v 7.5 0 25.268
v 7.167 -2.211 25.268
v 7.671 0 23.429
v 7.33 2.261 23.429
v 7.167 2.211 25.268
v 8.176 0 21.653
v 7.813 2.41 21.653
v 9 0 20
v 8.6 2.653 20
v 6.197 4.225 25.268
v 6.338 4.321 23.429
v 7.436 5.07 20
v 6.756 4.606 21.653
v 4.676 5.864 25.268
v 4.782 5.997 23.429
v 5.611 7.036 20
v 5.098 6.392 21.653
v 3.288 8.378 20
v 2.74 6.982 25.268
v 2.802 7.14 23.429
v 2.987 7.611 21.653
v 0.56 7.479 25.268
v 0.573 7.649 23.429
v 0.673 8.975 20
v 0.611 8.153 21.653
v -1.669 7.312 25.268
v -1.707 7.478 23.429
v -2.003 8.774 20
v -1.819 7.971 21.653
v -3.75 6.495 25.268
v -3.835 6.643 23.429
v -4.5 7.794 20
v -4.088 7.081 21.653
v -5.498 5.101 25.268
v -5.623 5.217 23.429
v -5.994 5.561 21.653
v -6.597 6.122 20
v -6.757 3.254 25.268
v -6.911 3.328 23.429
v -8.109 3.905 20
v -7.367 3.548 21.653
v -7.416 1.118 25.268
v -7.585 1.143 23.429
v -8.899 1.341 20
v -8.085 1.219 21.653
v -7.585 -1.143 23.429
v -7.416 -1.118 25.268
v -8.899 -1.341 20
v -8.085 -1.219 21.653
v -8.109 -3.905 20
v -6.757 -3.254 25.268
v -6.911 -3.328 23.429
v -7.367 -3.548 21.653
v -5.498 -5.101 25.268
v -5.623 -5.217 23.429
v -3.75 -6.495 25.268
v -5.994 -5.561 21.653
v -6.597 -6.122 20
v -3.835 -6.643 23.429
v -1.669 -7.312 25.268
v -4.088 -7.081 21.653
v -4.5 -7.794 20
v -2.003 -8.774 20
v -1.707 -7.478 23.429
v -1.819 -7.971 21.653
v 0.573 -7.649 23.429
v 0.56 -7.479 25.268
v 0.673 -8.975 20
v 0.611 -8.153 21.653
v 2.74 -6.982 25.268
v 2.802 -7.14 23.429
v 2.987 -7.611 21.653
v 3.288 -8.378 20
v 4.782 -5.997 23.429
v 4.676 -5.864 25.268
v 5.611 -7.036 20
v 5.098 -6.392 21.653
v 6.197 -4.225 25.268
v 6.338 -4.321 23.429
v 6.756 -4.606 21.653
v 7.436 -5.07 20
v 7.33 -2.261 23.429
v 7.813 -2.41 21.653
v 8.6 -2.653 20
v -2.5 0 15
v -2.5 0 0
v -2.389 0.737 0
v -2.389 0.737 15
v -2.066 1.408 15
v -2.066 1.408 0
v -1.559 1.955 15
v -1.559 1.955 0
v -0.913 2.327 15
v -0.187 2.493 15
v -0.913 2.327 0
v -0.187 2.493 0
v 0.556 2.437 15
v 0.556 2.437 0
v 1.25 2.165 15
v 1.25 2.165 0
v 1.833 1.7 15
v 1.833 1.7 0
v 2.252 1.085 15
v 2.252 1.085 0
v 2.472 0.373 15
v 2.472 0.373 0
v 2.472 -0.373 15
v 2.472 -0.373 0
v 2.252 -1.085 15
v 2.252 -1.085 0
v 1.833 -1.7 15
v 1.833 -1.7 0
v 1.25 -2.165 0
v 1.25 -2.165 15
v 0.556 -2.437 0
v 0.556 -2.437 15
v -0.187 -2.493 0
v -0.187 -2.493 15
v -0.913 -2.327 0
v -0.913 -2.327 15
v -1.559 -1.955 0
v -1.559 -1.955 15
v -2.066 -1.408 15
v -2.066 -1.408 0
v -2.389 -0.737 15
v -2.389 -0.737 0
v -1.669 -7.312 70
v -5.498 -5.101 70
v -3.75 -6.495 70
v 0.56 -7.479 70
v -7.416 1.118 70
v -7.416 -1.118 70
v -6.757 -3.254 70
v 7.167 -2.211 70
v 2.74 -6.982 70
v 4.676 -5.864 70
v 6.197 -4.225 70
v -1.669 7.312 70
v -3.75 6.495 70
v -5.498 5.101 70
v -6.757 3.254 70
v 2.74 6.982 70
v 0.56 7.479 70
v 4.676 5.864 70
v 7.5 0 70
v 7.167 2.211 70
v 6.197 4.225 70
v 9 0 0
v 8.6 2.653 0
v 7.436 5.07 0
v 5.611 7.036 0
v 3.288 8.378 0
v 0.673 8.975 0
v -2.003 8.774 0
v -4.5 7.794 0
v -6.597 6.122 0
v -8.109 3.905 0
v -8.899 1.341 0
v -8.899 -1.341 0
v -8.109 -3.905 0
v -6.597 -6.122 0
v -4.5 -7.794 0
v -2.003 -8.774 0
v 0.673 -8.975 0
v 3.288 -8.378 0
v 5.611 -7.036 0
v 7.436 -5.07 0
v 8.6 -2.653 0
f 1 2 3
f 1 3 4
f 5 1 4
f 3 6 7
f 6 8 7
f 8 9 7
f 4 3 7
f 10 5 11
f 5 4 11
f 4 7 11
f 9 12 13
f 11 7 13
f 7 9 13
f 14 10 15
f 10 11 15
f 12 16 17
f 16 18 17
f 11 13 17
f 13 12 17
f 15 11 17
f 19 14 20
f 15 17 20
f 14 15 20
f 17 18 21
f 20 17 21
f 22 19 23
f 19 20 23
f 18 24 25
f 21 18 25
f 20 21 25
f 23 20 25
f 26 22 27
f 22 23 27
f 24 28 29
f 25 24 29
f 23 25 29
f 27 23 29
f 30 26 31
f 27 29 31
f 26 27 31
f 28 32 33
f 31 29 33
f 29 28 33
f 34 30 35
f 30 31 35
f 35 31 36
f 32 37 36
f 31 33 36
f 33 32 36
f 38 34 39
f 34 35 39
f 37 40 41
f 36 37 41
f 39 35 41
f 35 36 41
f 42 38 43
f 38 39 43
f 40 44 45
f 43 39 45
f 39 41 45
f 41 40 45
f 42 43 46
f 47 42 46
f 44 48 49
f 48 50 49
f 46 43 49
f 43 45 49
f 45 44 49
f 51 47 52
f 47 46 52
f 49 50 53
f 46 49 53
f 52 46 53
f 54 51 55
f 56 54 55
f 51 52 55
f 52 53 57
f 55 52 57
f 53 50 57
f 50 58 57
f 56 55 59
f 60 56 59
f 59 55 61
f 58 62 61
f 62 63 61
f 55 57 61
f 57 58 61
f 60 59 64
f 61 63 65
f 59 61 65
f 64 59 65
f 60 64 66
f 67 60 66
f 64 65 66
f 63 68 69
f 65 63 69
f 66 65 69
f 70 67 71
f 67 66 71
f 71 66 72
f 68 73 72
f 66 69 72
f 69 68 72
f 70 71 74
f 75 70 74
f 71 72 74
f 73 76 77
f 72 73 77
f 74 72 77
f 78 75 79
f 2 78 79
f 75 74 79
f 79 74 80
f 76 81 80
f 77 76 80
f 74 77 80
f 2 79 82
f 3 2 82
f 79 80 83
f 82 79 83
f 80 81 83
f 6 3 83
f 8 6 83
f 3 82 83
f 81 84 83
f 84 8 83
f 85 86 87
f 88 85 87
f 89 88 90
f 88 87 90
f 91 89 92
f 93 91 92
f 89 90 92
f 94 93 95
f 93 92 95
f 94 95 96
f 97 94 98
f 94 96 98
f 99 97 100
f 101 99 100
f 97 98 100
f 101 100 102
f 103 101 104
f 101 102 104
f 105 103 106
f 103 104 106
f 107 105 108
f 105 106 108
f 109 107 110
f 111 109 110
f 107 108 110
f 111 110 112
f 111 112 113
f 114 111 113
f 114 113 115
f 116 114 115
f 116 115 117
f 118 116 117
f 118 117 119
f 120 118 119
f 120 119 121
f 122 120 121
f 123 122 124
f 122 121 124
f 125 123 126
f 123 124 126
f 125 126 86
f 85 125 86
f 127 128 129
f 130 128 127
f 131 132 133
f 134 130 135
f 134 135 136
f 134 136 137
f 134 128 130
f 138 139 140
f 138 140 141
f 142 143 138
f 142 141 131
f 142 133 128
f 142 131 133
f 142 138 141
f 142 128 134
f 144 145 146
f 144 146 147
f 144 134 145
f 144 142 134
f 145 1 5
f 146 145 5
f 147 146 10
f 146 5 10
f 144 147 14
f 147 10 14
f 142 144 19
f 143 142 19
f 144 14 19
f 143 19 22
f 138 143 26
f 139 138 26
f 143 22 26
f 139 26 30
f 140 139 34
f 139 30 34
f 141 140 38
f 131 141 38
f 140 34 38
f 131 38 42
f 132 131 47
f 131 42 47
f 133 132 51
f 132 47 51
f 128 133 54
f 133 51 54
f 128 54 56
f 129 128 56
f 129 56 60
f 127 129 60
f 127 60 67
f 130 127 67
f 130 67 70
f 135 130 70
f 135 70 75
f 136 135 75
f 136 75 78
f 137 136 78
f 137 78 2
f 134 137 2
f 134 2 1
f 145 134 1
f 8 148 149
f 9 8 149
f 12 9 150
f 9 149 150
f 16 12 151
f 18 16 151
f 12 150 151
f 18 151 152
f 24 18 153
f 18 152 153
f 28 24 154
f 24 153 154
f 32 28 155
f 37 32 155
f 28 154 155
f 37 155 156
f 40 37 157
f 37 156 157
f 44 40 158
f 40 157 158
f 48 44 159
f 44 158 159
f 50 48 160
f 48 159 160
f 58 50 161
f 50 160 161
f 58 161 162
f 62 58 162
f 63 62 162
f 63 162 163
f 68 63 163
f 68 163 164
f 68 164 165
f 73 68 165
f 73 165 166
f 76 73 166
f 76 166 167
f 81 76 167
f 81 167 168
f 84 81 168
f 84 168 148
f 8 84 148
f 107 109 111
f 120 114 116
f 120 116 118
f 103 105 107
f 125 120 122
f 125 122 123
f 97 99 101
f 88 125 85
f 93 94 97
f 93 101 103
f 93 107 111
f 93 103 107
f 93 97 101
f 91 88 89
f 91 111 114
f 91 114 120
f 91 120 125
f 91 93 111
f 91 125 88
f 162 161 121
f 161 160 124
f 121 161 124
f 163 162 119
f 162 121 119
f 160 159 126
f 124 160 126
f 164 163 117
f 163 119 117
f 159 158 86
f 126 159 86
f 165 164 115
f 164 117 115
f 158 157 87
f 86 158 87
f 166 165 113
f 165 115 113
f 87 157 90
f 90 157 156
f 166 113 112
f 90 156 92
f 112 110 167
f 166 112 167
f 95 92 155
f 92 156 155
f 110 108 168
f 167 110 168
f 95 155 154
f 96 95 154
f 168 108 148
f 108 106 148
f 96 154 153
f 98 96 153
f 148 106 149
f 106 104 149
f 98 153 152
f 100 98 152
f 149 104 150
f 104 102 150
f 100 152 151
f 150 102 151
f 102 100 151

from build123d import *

# Parameters (mm, degrees)
SKETCH1_R           = 9
BOSS_EXTRUDE1_DEPTH = 70
SKETCH2_R           = 2.5
CUT_EXTRUDE1_DEPTH  = 15
CUT_EXTRUDE2_START  = -50
SKETCH3_R           = 9
SKETCH3_R_2         = 7.5
CUT_EXTRUDE2_DEPTH  = 50
FILLET1_R           = 10


with BuildPart() as part:
    # Sketch1 → Boss-Extrude1 (new body)
    with BuildSketch(Plane.XY):
        Circle(SKETCH1_R)
    extrude(amount=BOSS_EXTRUDE1_DEPTH)

    # Sketch2 → Cut-Extrude1 (cut)
    with BuildSketch(Plane(origin=(0, 0, 0), x_dir=(-1, 0, 0), z_dir=(0, 0, -1))):
        Circle(SKETCH2_R)
    extrude(amount=-CUT_EXTRUDE1_DEPTH, mode=Mode.SUBTRACT)

    # Sketch3 → Cut-Extrude2 (cut)
    with BuildSketch(Plane.XY.offset(70).offset(CUT_EXTRUDE2_START)):
        Circle(SKETCH3_R)
        Circle(SKETCH3_R_2, mode=Mode.SUBTRACT)
    extrude(amount=CUT_EXTRUDE2_DEPTH, mode=Mode.SUBTRACT)

    # Fillet1
    # the kernel refuses this fillet: 10 mm, written as the material it adds along each edge
    with BuildSketch(Plane(origin=(0, 0, 20), x_dir=(1, 0, 0), z_dir=(0, -1, 0))) as fillet1_piece_1:
        with BuildLine():
            CenterArc((17.5, 5.267826876), FILLET1_R, 180, 31.788330617)
            Line((7.5, 5.267826876), (7.3, 5.267826876))
            Line((7.3, 5.267826876), (7.3, 0))
            Line((7.3, 0), (7.5, -0.2))
            ThreePointArc((7.5, -0.2), (8.25, -0.2), (8.83, -0.105356538))
            Line((8.83, -0.105356538), (9, 0))
        make_face()
    revolve(axis=Axis((0, 0, 20), (0, 0, 1)))


solid = part.part
